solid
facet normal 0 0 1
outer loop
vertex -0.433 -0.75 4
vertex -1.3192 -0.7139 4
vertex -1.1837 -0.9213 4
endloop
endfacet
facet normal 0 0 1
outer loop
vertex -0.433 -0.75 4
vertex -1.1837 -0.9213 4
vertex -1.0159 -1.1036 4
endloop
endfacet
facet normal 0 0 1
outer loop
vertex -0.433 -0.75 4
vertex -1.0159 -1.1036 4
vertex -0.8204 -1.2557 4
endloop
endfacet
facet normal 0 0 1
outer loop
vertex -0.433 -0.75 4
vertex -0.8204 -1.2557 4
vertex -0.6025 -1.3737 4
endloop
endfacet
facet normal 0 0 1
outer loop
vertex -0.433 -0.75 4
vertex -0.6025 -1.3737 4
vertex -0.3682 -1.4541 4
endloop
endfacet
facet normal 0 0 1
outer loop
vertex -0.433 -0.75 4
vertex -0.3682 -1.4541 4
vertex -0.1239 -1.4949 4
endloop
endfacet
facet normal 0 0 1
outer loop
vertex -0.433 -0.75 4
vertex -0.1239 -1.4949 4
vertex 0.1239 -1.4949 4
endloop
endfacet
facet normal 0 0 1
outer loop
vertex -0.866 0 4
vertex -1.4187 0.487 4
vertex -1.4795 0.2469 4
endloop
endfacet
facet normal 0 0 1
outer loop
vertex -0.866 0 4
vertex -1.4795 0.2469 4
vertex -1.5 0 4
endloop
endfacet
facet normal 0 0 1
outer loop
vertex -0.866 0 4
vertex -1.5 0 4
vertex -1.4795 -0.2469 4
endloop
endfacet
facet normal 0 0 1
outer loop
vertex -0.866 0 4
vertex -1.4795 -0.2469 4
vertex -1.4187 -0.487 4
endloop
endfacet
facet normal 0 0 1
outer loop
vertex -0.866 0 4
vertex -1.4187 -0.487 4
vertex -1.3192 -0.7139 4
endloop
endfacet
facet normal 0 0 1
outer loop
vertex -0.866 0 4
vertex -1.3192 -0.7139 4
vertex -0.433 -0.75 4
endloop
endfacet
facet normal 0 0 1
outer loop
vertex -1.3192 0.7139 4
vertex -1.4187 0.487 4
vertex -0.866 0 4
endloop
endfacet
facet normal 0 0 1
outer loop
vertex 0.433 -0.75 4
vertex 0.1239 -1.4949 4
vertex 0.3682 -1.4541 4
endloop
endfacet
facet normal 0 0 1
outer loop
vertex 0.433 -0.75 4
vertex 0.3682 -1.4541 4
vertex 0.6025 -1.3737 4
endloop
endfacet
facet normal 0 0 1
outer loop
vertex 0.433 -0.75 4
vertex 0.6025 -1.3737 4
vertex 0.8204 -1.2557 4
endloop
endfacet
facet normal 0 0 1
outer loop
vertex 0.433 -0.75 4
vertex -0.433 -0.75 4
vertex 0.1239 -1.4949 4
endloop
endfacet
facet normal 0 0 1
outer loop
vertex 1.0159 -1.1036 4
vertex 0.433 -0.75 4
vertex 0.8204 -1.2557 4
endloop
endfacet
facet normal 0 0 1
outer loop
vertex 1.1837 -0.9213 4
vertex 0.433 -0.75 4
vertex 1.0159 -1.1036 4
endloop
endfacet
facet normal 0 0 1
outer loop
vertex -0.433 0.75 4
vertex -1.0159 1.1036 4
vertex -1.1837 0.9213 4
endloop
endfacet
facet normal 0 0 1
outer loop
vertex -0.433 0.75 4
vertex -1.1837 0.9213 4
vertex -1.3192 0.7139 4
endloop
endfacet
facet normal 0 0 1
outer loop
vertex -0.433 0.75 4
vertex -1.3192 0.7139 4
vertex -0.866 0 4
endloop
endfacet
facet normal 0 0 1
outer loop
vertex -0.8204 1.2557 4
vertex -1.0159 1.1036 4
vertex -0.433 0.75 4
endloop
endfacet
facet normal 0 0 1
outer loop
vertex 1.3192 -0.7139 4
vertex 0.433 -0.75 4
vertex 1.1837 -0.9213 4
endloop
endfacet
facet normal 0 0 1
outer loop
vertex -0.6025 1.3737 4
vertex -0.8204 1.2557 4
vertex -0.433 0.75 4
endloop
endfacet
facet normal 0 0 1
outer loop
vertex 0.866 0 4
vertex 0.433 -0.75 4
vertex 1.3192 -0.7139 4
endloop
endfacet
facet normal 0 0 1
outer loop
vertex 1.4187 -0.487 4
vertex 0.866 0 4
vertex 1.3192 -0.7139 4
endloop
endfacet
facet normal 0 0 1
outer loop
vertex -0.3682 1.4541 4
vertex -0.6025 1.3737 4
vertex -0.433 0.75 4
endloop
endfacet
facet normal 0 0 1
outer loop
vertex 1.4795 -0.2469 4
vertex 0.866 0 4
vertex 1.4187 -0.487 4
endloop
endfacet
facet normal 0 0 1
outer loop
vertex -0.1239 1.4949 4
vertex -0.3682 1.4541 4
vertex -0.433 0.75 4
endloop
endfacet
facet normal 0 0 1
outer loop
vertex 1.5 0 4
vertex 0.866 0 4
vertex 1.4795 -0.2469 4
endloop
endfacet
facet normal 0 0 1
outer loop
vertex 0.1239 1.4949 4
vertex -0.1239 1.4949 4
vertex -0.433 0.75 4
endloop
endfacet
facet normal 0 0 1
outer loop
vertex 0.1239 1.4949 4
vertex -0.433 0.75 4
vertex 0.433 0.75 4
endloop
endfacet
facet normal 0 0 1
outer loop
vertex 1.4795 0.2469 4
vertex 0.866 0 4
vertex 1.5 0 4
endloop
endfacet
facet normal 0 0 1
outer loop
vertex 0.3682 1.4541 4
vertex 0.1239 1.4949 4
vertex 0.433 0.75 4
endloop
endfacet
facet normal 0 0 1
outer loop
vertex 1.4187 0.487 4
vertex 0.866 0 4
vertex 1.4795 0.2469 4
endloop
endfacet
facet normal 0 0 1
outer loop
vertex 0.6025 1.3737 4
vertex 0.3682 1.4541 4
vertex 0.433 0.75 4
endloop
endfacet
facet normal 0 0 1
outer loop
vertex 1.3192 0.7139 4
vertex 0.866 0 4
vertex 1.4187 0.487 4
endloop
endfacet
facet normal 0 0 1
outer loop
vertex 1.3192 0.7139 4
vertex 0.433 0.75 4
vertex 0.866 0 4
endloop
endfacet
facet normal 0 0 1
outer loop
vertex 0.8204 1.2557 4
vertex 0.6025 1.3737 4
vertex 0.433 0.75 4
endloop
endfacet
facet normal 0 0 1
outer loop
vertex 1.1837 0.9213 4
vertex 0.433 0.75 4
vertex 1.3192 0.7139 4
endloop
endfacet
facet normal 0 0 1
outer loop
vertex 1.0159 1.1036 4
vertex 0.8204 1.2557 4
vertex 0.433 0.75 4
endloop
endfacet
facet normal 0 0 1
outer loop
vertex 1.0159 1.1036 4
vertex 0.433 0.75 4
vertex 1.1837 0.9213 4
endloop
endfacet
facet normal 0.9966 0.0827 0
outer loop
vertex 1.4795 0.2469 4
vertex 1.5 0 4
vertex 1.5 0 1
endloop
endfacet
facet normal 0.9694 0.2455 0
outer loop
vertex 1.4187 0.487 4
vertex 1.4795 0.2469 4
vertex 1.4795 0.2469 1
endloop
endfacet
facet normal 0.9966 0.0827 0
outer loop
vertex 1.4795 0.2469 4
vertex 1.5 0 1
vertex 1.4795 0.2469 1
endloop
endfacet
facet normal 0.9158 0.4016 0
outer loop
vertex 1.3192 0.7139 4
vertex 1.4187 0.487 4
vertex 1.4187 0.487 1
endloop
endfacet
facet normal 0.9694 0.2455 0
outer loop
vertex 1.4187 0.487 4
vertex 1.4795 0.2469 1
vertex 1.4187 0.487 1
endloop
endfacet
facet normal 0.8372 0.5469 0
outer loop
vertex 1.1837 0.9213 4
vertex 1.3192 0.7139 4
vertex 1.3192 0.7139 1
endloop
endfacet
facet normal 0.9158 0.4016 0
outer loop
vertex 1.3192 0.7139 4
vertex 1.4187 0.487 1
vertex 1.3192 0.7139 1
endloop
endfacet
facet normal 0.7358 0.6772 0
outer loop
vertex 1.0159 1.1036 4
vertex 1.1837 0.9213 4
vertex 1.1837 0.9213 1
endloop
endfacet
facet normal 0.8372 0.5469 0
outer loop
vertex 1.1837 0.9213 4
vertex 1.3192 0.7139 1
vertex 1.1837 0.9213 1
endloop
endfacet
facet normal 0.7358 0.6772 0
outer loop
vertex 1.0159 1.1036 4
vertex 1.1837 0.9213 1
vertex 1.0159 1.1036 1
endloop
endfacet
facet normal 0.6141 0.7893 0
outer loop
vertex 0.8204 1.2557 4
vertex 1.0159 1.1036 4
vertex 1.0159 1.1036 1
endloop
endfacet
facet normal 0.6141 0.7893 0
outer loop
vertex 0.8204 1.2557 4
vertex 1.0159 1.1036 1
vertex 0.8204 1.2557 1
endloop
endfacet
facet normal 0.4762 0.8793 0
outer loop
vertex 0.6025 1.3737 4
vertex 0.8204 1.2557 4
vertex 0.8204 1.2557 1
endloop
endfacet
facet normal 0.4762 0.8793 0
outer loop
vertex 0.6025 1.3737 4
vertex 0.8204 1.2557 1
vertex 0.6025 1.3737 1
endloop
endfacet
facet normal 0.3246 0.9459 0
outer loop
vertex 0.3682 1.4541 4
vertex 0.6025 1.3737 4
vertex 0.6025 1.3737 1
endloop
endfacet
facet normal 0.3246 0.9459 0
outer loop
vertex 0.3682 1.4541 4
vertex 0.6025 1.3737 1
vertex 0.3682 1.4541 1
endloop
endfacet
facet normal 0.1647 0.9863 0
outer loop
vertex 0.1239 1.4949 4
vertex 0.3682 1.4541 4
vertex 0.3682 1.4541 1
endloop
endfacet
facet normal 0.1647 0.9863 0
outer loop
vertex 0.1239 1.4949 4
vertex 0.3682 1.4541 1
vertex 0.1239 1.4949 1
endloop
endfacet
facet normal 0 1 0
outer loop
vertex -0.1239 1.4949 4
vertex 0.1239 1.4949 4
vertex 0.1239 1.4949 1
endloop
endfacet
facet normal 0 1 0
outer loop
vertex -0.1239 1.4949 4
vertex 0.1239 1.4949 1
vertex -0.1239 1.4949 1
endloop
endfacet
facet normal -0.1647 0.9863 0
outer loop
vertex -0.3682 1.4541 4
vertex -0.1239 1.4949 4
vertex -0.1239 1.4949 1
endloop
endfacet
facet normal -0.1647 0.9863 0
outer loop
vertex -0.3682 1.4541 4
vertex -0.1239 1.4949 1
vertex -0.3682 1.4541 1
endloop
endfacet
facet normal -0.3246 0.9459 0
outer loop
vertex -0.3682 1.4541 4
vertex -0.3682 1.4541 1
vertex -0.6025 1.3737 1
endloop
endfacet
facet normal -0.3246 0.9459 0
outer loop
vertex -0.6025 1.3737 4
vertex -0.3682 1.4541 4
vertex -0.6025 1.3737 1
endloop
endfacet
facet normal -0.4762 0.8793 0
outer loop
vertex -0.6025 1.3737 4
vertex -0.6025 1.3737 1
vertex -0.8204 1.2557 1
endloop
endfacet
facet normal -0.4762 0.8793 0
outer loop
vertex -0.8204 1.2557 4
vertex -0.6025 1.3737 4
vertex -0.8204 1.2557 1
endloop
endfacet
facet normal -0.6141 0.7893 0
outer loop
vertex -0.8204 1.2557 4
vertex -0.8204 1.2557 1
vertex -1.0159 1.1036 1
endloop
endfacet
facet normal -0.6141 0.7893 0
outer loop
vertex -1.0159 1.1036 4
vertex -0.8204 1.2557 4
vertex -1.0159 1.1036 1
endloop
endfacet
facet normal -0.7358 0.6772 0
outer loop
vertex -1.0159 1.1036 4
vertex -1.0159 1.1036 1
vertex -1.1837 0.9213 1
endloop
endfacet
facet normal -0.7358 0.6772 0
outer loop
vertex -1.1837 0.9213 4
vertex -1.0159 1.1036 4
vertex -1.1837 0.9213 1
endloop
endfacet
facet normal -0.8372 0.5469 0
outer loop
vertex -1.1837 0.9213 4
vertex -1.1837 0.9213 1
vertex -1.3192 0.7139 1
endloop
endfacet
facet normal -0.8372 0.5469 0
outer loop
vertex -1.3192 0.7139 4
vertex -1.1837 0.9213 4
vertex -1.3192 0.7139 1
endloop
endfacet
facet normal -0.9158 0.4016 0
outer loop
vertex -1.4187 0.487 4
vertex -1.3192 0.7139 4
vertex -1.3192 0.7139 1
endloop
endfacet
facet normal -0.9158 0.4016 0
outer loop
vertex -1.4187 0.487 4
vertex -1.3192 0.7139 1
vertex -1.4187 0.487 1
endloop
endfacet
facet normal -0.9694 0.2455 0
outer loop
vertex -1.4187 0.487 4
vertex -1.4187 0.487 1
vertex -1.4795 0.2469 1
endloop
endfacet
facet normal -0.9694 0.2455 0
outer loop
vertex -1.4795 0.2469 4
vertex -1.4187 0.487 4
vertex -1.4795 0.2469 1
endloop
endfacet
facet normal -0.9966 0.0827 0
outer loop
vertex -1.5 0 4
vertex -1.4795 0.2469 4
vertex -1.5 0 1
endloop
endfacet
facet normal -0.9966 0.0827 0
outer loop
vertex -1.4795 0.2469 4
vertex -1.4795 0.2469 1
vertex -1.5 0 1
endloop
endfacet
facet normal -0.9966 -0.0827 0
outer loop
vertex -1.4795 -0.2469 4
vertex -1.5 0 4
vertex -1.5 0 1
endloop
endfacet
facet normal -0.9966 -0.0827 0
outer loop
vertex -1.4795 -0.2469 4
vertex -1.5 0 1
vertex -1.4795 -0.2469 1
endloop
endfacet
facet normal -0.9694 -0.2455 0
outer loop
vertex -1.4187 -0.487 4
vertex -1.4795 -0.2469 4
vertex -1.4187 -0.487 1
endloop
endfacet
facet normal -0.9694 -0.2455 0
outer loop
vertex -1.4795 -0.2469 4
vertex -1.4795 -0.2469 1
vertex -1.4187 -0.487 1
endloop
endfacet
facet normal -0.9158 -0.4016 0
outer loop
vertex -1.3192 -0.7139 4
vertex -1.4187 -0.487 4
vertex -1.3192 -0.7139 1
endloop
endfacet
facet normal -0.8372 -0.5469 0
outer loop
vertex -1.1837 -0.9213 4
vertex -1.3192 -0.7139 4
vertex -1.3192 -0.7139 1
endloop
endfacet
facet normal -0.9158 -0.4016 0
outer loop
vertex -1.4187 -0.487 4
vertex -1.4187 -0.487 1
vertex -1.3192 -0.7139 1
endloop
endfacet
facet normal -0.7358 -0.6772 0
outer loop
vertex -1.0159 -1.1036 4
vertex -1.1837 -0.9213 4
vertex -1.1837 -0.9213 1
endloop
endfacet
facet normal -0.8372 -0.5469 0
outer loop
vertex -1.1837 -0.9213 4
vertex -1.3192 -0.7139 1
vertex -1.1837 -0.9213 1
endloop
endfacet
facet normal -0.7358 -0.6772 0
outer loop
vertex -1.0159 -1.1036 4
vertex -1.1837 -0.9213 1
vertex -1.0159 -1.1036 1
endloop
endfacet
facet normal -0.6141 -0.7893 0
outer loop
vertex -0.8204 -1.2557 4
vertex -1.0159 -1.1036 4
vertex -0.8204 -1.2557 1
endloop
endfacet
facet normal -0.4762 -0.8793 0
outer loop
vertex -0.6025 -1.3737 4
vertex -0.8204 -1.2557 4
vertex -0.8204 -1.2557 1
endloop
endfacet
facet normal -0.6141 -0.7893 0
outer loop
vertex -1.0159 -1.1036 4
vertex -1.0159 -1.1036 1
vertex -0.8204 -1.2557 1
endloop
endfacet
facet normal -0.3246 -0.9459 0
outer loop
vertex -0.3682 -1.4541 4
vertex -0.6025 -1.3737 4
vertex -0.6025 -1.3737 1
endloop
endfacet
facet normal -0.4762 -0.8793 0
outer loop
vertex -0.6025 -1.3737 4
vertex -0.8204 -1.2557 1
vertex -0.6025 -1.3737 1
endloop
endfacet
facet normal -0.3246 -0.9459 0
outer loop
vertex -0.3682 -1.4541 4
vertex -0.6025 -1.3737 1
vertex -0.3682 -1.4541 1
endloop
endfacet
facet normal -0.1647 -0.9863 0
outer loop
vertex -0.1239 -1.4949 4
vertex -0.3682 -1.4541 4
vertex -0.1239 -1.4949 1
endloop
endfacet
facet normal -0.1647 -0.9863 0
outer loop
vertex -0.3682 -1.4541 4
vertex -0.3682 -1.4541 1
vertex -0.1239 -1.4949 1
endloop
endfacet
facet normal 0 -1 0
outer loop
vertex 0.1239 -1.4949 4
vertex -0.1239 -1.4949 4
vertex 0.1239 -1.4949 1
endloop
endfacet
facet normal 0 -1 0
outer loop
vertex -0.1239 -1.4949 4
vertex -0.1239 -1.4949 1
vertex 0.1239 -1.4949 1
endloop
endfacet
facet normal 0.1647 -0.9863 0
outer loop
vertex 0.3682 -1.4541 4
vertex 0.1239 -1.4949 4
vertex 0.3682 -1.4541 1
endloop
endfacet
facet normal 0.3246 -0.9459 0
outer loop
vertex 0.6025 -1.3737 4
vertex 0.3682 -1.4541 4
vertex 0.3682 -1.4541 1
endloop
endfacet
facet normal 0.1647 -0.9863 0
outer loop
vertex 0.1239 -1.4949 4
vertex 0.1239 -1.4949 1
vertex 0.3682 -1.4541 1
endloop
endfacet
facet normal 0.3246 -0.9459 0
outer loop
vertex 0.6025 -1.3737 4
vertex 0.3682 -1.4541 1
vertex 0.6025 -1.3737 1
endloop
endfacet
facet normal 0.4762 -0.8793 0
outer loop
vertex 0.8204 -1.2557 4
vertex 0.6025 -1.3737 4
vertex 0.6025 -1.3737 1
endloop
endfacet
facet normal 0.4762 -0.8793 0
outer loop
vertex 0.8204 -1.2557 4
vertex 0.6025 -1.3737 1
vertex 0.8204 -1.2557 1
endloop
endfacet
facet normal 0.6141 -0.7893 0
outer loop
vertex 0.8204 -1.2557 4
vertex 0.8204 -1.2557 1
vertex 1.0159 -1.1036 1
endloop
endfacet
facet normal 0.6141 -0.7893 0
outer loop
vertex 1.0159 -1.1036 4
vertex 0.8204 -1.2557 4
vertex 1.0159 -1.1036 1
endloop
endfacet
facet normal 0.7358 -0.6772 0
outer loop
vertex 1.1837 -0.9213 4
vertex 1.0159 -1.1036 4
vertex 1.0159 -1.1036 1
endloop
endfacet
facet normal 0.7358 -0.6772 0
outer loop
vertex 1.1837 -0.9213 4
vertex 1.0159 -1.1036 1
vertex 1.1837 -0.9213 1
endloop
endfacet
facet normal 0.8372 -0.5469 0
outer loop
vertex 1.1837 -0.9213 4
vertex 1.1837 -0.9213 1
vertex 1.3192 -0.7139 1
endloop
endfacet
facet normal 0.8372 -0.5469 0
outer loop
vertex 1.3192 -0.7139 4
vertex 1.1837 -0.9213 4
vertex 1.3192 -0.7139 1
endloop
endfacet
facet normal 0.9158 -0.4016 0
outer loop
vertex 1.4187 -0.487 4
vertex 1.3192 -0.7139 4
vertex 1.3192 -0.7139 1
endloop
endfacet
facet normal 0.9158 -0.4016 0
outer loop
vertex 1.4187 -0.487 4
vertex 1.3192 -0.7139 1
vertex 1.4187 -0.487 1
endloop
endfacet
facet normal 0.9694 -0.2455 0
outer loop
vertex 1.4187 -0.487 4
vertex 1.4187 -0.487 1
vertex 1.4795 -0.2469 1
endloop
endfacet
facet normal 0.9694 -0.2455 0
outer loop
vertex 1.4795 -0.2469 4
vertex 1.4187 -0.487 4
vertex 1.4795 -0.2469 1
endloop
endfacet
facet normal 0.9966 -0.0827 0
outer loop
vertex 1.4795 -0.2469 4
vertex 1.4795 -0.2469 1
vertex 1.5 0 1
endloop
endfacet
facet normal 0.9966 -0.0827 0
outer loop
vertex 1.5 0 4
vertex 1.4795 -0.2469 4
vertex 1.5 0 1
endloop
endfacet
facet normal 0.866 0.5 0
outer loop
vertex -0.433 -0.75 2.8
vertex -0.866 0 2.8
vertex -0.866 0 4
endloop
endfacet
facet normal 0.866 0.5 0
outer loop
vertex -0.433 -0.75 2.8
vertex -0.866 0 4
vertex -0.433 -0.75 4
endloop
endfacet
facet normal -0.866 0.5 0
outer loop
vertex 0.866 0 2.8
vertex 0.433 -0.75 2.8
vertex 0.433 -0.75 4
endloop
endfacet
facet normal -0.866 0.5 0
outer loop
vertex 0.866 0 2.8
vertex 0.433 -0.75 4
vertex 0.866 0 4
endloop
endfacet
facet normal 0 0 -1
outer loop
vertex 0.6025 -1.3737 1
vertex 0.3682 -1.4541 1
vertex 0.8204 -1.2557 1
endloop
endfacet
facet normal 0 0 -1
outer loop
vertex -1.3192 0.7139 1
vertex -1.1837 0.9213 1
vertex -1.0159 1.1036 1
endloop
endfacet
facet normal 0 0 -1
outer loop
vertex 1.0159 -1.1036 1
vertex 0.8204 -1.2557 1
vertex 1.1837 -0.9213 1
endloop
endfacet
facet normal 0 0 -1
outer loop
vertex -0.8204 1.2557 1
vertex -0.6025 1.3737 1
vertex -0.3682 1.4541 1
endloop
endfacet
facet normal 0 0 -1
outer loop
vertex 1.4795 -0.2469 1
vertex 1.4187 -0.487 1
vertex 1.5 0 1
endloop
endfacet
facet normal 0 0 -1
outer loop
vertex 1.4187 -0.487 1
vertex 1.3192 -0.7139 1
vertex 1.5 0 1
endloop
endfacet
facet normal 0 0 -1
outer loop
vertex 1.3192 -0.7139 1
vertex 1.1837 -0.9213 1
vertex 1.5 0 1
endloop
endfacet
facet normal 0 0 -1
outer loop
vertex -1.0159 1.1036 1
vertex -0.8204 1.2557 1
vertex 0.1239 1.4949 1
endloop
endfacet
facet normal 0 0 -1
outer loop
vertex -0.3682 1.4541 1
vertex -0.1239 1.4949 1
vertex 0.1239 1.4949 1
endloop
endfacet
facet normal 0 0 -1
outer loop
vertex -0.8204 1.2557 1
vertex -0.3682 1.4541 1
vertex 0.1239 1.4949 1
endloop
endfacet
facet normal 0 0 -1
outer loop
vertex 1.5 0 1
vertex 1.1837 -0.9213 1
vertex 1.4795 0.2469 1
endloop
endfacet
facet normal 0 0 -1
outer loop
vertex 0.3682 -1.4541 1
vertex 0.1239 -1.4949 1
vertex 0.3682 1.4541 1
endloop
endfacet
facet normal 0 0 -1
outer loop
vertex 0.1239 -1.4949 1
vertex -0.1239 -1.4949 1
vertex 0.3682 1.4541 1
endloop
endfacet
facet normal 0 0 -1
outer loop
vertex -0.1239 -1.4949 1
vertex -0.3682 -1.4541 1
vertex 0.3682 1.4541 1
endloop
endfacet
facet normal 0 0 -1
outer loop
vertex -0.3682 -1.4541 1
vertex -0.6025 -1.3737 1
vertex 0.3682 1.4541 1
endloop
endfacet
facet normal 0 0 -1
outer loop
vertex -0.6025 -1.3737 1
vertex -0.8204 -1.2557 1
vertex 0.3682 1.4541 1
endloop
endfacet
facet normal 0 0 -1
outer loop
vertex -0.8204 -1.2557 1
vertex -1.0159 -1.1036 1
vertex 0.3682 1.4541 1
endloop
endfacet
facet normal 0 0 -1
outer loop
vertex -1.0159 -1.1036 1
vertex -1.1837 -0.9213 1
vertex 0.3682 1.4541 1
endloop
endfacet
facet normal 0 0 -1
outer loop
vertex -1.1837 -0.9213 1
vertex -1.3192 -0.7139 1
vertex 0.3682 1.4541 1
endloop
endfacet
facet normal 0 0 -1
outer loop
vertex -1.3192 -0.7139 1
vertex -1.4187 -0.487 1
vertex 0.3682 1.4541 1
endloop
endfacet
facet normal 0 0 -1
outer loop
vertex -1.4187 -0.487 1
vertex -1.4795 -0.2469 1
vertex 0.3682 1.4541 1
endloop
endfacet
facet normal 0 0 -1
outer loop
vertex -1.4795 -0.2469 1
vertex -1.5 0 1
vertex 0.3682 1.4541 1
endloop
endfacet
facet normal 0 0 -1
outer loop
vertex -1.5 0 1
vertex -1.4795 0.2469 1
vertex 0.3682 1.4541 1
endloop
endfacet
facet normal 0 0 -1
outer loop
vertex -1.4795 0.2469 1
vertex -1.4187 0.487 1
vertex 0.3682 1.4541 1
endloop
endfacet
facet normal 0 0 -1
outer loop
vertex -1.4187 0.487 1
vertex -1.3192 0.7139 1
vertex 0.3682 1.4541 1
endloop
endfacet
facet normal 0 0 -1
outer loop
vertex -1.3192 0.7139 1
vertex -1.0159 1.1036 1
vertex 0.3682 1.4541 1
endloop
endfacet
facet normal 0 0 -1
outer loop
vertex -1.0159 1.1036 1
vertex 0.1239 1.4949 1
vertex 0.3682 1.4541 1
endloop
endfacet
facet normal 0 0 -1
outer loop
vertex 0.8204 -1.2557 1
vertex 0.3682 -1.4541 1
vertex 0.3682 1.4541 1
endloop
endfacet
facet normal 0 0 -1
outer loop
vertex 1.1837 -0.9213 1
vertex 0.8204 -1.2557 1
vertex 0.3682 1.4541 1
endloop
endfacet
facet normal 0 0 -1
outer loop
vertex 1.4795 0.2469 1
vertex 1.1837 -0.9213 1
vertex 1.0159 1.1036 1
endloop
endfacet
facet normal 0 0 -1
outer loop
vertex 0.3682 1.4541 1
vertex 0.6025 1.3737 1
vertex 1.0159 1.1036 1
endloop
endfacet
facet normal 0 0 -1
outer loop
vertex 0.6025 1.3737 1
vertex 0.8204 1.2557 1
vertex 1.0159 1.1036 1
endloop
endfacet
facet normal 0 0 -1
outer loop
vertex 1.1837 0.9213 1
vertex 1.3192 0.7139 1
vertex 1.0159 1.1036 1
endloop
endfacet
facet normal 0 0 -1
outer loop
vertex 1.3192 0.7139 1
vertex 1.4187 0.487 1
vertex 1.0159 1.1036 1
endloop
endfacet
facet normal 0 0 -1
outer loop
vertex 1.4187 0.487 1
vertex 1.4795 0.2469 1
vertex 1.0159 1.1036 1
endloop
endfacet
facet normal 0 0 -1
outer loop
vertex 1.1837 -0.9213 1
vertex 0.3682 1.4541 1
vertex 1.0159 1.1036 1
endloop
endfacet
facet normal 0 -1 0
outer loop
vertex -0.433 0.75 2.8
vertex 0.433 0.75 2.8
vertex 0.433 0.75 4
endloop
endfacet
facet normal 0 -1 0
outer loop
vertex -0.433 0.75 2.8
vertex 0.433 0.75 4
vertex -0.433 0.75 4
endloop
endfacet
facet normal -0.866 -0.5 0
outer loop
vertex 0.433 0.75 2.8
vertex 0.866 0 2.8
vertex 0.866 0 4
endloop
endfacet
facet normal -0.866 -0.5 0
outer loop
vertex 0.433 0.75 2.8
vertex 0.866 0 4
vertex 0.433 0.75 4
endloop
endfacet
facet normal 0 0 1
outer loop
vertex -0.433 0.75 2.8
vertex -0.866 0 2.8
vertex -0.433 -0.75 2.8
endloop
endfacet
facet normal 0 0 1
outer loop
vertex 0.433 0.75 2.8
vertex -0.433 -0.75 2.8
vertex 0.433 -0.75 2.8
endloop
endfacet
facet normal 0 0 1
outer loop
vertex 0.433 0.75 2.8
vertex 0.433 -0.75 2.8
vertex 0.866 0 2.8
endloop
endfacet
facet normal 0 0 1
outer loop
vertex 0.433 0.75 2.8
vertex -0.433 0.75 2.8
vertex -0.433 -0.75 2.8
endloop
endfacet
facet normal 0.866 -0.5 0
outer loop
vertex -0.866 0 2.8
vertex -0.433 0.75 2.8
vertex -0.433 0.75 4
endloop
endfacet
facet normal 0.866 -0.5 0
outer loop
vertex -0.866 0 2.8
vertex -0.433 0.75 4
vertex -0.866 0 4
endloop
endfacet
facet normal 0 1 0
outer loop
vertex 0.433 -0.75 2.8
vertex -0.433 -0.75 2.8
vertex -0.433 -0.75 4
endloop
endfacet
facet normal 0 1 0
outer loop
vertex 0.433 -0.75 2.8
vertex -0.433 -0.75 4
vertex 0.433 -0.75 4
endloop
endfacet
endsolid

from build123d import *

# Parameters (mm, degrees)
S01_M3_HEADLESS_BODY_R                 = 1.5
F_01_M3_HEADLESS_BODY_DEPTH            = 4
F_02_START                             = 2.8
F_02_1_5_MM_HEX_SOCKET_DEPTH           = 1.3
THREE_START                            = 1
THREE_MILLIMETRE_SCREW_LENGTH_LAYOUT_R = 2
THREE_MILLIMETRE_SCREW_LENGTH_DEPTH    = 1.1


with BuildPart() as part:
    # S01 - M3 headless body → 01 - M3 headless body (new body)
    with BuildSketch(Plane.XY):
        Circle(S01_M3_HEADLESS_BODY_R)
    extrude(amount=F_01_M3_HEADLESS_BODY_DEPTH)

    # S02 - 1.5 mm hex socket → 02 - 1.5 mm hex socket (cut)
    with BuildSketch(Plane.XY.offset(F_02_START)):
        Polygon((0.866025404, 0), (0.433012702, 0.75), (-0.433012702, 0.75), (-0.866025404, 0), (-0.433012702, -0.75), (0.433012702, -0.75), align=None)
    extrude(amount=F_02_1_5_MM_HEX_SOCKET_DEPTH, mode=Mode.SUBTRACT)

    # Three millimetre screw length layout → Three millimetre screw length (cut)
    with BuildSketch(Plane.XY.offset(THREE_START)):
        Circle(THREE_MILLIMETRE_SCREW_LENGTH_LAYOUT_R)
    extrude(amount=-THREE_MILLIMETRE_SCREW_LENGTH_DEPTH, mode=Mode.SUBTRACT)


solid = part.part
